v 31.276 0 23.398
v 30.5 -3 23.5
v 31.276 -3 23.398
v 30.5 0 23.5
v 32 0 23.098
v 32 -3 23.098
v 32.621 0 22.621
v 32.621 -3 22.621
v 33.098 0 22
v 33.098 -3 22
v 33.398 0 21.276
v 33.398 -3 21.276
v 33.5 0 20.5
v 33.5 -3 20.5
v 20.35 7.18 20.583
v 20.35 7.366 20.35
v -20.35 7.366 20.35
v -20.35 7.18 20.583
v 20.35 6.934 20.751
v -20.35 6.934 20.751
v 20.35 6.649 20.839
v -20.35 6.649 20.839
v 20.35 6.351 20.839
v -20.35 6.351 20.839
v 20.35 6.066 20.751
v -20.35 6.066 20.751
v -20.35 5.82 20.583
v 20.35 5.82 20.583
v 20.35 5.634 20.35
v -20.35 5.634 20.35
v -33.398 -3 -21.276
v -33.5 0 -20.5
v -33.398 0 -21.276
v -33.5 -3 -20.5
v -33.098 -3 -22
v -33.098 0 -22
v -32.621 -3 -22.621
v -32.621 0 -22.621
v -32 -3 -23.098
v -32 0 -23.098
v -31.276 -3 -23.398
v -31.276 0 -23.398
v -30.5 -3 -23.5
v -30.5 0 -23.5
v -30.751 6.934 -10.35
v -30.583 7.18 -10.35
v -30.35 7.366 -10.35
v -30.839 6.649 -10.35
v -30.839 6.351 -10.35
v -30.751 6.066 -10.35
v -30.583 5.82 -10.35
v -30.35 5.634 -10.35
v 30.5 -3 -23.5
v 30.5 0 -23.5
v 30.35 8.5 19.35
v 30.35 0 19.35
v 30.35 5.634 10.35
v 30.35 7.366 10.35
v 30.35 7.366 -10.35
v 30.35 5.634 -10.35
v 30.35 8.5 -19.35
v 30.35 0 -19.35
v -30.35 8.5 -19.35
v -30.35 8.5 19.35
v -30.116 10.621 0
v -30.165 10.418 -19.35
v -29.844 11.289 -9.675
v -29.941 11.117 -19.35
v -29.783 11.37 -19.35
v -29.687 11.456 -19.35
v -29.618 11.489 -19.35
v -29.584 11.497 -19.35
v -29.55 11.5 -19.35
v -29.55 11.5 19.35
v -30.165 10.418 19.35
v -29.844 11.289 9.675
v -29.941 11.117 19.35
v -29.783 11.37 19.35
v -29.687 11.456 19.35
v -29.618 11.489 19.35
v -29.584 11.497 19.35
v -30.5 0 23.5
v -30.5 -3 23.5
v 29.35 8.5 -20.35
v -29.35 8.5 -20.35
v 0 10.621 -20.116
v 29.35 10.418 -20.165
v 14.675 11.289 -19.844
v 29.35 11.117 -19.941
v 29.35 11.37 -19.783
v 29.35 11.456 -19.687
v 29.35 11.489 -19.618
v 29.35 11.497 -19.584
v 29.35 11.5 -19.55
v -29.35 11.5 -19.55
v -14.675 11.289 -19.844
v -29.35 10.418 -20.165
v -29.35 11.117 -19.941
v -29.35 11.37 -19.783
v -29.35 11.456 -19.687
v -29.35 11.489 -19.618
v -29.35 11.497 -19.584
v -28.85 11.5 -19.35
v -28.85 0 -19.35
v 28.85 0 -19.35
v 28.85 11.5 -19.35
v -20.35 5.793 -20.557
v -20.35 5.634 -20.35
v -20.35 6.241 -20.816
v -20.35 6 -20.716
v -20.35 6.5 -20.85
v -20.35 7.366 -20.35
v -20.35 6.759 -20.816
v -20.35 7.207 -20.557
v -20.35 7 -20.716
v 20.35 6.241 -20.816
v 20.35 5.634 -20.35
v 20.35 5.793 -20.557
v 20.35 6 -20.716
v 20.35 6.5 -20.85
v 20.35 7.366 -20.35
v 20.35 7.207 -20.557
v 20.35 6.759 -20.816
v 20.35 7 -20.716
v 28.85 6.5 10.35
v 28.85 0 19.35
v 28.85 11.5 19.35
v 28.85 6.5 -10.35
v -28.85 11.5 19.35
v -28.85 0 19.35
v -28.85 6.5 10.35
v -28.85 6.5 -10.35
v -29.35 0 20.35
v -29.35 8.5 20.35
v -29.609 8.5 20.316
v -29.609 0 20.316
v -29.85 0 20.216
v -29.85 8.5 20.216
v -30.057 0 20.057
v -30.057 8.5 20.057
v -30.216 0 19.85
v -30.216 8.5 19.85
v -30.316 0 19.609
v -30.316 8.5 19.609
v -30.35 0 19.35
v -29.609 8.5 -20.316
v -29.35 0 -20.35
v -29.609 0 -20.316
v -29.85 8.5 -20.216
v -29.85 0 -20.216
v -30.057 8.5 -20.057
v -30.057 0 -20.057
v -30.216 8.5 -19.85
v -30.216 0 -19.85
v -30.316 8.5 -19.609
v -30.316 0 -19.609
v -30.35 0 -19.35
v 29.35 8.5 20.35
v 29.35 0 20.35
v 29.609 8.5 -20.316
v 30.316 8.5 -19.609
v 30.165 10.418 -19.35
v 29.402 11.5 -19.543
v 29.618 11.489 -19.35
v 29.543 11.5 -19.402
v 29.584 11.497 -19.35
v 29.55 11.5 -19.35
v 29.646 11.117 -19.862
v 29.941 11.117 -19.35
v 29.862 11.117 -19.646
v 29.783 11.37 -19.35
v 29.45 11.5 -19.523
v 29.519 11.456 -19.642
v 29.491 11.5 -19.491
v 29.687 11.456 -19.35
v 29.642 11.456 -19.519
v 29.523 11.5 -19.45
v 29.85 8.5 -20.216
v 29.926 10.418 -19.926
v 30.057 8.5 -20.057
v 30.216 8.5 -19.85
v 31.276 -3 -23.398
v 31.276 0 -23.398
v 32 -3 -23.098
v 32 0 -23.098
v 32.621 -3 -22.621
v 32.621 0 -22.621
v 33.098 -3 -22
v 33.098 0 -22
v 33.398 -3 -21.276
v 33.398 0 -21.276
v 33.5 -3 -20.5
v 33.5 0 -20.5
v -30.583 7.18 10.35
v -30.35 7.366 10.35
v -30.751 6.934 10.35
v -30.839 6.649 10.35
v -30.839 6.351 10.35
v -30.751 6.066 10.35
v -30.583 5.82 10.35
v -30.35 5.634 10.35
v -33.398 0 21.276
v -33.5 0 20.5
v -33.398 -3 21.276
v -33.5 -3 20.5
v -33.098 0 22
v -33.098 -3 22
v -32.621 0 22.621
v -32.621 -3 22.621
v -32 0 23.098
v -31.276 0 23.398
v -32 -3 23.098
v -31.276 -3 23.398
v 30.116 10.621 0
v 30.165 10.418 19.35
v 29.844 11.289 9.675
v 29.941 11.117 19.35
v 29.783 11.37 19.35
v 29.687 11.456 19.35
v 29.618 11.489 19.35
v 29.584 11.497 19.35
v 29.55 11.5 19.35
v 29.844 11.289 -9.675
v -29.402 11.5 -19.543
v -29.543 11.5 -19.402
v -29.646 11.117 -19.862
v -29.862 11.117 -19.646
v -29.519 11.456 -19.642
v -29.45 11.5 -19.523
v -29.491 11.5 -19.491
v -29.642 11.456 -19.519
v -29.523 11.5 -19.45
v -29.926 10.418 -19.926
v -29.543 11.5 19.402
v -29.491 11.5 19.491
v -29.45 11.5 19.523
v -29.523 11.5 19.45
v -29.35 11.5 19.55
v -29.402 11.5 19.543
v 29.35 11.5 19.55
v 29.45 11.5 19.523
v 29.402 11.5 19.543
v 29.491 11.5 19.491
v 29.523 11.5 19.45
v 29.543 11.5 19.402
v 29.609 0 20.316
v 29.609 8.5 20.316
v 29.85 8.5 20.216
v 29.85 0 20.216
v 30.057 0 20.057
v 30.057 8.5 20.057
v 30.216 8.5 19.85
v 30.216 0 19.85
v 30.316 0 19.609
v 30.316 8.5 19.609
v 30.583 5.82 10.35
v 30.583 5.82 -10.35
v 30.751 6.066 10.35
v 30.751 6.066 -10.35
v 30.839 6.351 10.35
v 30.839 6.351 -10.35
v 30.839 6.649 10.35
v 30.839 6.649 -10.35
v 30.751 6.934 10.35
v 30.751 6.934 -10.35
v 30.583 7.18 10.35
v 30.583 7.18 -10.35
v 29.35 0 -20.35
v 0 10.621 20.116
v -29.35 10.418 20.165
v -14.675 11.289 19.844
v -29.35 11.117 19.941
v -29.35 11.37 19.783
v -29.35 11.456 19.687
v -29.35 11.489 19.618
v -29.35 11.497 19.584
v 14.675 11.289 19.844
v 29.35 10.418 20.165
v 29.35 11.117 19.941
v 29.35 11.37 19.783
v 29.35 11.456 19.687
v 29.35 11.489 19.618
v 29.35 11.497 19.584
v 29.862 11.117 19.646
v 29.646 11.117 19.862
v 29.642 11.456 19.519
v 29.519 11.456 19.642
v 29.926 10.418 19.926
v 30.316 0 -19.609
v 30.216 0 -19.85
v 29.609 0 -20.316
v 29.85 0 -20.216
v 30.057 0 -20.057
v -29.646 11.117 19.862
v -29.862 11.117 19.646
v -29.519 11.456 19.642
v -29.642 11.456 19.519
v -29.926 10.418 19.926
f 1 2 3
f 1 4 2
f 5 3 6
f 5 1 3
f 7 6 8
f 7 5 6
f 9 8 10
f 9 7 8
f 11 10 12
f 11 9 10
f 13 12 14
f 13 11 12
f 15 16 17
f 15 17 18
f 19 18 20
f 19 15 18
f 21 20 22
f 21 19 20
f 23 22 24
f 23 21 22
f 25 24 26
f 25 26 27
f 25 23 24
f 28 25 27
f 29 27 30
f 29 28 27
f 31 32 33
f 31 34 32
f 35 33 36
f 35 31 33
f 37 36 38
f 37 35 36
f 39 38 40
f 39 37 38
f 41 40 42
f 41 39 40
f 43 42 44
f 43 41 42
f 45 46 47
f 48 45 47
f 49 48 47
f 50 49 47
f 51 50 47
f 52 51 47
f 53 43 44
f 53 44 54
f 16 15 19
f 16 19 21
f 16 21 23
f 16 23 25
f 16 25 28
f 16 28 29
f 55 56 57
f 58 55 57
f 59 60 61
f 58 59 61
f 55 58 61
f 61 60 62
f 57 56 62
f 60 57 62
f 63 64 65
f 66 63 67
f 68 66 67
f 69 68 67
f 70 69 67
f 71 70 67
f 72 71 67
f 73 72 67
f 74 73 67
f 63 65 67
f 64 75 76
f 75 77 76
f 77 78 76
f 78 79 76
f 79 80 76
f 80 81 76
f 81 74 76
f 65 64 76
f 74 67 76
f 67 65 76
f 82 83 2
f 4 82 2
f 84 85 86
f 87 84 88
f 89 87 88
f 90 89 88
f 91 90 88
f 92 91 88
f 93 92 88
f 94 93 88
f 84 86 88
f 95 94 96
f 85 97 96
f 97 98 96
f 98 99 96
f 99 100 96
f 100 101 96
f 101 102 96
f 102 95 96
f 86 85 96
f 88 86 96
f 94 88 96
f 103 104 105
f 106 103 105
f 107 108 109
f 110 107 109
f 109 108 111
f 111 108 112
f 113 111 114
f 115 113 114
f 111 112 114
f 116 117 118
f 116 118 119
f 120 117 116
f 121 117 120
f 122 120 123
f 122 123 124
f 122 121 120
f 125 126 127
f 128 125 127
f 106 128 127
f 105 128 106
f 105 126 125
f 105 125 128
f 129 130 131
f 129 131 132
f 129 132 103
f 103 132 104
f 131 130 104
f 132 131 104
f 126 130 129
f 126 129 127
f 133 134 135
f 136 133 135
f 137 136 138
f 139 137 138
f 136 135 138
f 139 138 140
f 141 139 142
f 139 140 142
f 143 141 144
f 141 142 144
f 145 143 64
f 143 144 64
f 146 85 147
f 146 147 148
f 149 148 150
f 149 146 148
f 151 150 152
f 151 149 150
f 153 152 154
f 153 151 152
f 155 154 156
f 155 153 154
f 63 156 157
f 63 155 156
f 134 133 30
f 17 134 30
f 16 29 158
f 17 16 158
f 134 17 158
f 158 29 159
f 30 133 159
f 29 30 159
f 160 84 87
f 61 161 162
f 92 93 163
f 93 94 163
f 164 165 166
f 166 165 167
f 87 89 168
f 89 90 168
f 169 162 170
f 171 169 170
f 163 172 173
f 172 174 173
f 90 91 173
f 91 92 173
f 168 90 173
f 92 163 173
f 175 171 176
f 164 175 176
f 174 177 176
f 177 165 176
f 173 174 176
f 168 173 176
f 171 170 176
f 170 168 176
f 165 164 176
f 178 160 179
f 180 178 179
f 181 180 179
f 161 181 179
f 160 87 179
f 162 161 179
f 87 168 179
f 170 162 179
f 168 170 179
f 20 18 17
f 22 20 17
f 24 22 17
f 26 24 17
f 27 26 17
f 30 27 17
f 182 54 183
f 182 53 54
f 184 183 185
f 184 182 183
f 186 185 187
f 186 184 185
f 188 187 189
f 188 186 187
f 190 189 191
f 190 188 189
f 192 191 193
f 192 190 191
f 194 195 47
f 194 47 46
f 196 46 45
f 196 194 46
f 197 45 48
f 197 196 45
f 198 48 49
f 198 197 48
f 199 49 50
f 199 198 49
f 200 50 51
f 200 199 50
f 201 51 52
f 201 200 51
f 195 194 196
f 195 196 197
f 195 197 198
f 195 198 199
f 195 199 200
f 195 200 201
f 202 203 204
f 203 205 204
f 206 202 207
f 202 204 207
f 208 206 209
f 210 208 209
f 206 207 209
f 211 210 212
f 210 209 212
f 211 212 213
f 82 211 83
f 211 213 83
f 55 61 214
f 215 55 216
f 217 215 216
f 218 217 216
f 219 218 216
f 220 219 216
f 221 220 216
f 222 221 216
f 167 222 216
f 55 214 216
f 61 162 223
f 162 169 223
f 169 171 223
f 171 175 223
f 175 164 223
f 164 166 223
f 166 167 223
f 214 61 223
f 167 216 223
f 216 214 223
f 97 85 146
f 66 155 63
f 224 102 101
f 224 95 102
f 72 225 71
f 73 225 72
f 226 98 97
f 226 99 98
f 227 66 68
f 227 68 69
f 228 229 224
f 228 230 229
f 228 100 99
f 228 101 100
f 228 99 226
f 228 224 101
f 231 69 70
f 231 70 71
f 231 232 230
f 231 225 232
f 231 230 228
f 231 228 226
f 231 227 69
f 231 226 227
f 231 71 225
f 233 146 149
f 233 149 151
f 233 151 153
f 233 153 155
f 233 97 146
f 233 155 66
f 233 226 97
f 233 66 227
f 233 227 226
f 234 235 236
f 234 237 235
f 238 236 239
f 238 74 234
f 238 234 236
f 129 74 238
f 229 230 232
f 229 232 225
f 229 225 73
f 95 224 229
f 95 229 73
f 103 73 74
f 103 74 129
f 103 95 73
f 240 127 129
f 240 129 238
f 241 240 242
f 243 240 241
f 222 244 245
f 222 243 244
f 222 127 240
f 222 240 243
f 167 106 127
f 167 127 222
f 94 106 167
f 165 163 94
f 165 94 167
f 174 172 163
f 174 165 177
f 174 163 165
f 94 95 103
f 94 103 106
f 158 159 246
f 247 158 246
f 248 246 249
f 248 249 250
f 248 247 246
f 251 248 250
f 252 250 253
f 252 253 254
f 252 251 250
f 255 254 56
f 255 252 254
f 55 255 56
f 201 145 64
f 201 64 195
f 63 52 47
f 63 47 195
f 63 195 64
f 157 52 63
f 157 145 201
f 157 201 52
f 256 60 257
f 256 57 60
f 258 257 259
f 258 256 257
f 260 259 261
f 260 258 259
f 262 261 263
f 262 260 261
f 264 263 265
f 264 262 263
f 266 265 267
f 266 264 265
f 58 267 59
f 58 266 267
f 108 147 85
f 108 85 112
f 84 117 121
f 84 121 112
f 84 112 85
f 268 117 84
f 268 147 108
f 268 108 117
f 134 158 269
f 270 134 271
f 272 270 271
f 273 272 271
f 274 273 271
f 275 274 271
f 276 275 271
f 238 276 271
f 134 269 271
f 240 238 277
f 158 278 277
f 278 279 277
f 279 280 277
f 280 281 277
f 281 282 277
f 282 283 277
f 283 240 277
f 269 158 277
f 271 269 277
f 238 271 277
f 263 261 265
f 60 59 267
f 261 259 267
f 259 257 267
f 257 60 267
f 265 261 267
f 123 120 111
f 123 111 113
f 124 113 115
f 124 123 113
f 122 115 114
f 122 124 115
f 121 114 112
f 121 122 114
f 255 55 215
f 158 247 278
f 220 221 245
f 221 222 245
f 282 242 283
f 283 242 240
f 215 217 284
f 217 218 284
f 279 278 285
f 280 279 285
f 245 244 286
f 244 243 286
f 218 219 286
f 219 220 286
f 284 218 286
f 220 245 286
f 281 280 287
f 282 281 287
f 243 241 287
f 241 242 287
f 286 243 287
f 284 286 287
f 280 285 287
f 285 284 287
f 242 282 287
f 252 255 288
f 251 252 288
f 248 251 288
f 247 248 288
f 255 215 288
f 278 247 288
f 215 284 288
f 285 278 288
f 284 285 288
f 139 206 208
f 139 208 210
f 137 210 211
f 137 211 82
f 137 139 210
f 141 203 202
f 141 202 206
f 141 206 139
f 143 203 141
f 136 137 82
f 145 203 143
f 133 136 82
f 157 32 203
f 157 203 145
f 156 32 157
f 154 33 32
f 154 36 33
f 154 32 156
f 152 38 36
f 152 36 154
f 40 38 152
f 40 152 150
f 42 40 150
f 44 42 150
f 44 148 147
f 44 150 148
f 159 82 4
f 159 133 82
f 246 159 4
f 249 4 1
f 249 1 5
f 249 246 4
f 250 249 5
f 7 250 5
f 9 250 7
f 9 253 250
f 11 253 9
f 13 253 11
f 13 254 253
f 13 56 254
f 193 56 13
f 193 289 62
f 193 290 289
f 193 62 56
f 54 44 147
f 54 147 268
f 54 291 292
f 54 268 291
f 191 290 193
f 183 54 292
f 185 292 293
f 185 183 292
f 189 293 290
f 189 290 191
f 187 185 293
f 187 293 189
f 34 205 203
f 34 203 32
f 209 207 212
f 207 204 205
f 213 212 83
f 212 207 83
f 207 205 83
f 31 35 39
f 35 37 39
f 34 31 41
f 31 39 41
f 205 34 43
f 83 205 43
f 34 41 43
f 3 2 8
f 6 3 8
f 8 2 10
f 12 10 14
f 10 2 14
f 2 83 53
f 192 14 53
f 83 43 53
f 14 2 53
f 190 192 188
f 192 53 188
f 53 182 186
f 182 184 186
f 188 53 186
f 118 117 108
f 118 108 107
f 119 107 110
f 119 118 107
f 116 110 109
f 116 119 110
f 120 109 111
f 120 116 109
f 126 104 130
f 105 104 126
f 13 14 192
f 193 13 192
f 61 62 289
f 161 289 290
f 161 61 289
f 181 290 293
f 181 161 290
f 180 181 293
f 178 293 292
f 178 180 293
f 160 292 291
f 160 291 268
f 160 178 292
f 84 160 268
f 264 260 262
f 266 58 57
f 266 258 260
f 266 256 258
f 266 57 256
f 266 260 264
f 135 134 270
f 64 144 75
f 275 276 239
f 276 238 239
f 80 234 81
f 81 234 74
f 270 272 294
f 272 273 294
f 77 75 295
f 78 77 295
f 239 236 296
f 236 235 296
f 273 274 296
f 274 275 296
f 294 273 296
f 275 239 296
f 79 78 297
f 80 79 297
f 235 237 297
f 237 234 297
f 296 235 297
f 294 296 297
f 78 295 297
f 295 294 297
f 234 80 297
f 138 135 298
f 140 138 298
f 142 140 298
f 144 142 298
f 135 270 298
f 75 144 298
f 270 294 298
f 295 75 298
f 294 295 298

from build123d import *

# Parameters (mm, degrees)
SKETCH1_W           = 61
SKETCH1_H           = 41
BOSS_EXTRUDE1_DEPTH = 23
SHELL1_T            = 3
SKETCH2_W           = 67
SKETCH2_H           = 47
CUT_EXTRUDE1_DEPTH  = 23
SKETCH3_W           = 60.7
SKETCH3_H           = 40.7
SKETCH3_W_2         = 57.7
SKETCH3_H_2         = 38.7
BOSS_EXTRUDE2_DEPTH = 11.5
BOSS_EXTRUDE3_START = -10
SKETCH4_R           = 1
BOSS_EXTRUDE3_DEPTH = 20.7
BOSS_EXTRUDE4_START = -10
BOSS_EXTRUDE4_DEPTH = 40.7
FILLET1_R           = 3
FILLET2_R           = 1
FILLET3_SIZE        = 3
FILLET3_SIZE_2      = 0.8


with BuildPart() as part:
    # Sketch1 → Boss-Extrude1 (new body)
    with BuildSketch(Plane(origin=(0, 0, 0), x_dir=(1, 0, 0), z_dir=(0, 1, 0))):
        Rectangle(SKETCH1_W, SKETCH1_H)
    extrude(amount=BOSS_EXTRUDE1_DEPTH)

    # Shell1
    shell1_openings = [part.faces().sort_by_distance(p)[0] for p in [
        (0, 23, 0),
    ]]
    offset(amount=SHELL1_T, openings=shell1_openings, kind=Kind.INTERSECTION)

    # Sketch2 → Cut-Extrude1 (cut)
    with BuildSketch(Plane(origin=(0, 23, 0), x_dir=(1, 0, 0), z_dir=(0, 1, 0))):
        Rectangle(SKETCH2_W, SKETCH2_H)
    extrude(amount=-CUT_EXTRUDE1_DEPTH, mode=Mode.SUBTRACT)

    # Sketch3 → Boss-Extrude2 (add)
    with BuildSketch(Plane(origin=(0, 0, 0), x_dir=(1, 0, 0), z_dir=(0, 1, 0))):
        Rectangle(SKETCH3_W, SKETCH3_H)
        Rectangle(SKETCH3_W_2, SKETCH3_H_2, mode=Mode.SUBTRACT)
    extrude(amount=BOSS_EXTRUDE2_DEPTH)

    # Sketch4 → Boss-Extrude3 (add)
    with BuildSketch(Plane.XY.offset(20.35).offset(BOSS_EXTRUDE3_START)):
        with Locations((-29.85, 6.5)):
            Circle(SKETCH4_R)
        with Locations((29.85, 6.5)):
            Circle(SKETCH4_R)
    extrude(amount=-BOSS_EXTRUDE3_DEPTH)

    # Sketch5 → Boss-Extrude4 (add)
    with BuildSketch(Plane(origin=(30.35, 0, 0), x_dir=(0, 0, -1), z_dir=(1, 0, 0)).offset(BOSS_EXTRUDE4_START)):
        with BuildLine():
            Line((-20.35, 5.633974596), (-20.35, 7.366025404))
            ThreePointArc((-20.35, 7.366025404), (-20.85, 6.5), (-20.35, 5.633974596))
        make_face()
        with BuildLine():
            ThreePointArc((20.35, 5.633974596), (20.716025404, 6), (20.85, 6.5))
            ThreePointArc((20.85, 6.5), (20.716025404, 7), (20.35, 7.366025404))
            Line((20.35, 7.366025404), (20.35, 5.633974596))
        make_face()
    extrude(amount=-BOSS_EXTRUDE4_DEPTH)

    # Fillet1
    fillet1_edges = [part.edges().sort_by_distance(p)[0] for p in [
        (33.5, -1.5, 23.5),
        (-33.5, -1.5, 23.5),
        (-33.5, -1.5, -23.5),
        (33.5, -1.5, -23.5),
    ]]
    fillet(fillet1_edges, radius=FILLET1_R)

    # Fillet2
    fillet2_edges = [part.edges().sort_by_distance(p)[0] for p in [
        (30.35, 5.75, 20.35),
        (30.35, 5.75, -20.35),
        (-30.35, 5.75, -20.35),
        (-30.35, 5.75, 20.35),
    ]]
    fillet(fillet2_edges, radius=FILLET2_R)

    # Fillet3
    # an asymmetric fillet: 3, 0.8 mm, written as the material it takes off along each edge
    with BuildSketch(Plane(origin=(30.35, 11.5, -19.35), x_dir=(0, -1, 0), z_dir=(0, 0, 1)), Plane(origin=(-30.35, 11.5, 19.35), x_dir=(0, -1, 0), z_dir=(0, 0, -1))) as fillet3_piece_1:
        with BuildLine():
            Bezier((FILLET3_SIZE, 0), (0, 0), (0, -FILLET3_SIZE_2), weights=[1, 0.707106781, 1])
            Line((0, -FILLET3_SIZE_2), (0, 0))
            Line((0, 0), (FILLET3_SIZE, 0))
        make_face()
    extrude(amount=38.7, mode=Mode.SUBTRACT)
    with BuildSketch(Plane(origin=(29.35, 11.5, -19.35), x_dir=(0, 0, -1), z_dir=(-1, 0, 0))) as fillet3_piece_2:
        with BuildLine():
            Bezier((1, FILLET3_SIZE), (1, 0), (1 - FILLET3_SIZE_2, 0), weights=[1, 0.707106781, 1])
            Line((1 - FILLET3_SIZE_2, 0), (1, 0))
            Line((1, 0), (1, FILLET3_SIZE))
        make_face()
    revolve(axis=Axis((29.35, 11.5, -19.35), (0, -1, 0)), revolution_arc=90, mode=Mode.SUBTRACT)
    with BuildSketch(Plane(origin=(29.35, 11.5, 19.35), x_dir=(1, 0, 0), z_dir=(0, 0, -1))) as fillet3_piece_3:
        with BuildLine():
            Bezier((1, FILLET3_SIZE), (1, 0), (1 - FILLET3_SIZE_2, 0), weights=[1, 0.707106781, 1])
            Line((1 - FILLET3_SIZE_2, 0), (1, 0))
            Line((1, 0), (1, FILLET3_SIZE))
        make_face()
    revolve(axis=Axis((29.35, 11.5, 19.35), (0, -1, 0)), revolution_arc=90, mode=Mode.SUBTRACT)
    with BuildSketch(Plane(origin=(-29.35, 11.5, -20.35), x_dir=(0, -1, 0), z_dir=(1, 0, 0)), Plane(origin=(29.35, 11.5, 20.35), x_dir=(0, -1, 0), z_dir=(-1, 0, 0))) as fillet3_piece_4:
        with BuildLine():
            Bezier((FILLET3_SIZE, 0), (0, 0), (0, -FILLET3_SIZE_2), weights=[1, 0.707106781, 1])
            Line((0, -FILLET3_SIZE_2), (0, 0))
            Line((0, 0), (FILLET3_SIZE, 0))
        make_face()
    extrude(amount=58.7, mode=Mode.SUBTRACT)
    with BuildSketch(Plane(origin=(-29.35, 11.5, -19.35), x_dir=(0, 0, -1), z_dir=(1, 0, 0))) as fillet3_piece_5:
        with BuildLine():
            Bezier((1, -FILLET3_SIZE), (1, 0), (1 - FILLET3_SIZE_2, 0), weights=[1, 0.707106781, 1])
            Line((1 - FILLET3_SIZE_2, 0), (1, 0))
            Line((1, 0), (1, -FILLET3_SIZE))
        make_face()
    revolve(axis=Axis((-29.35, 11.5, -19.35), (0, 1, 0)), revolution_arc=90, mode=Mode.SUBTRACT)
    with BuildSketch(Plane(origin=(-29.35, 11.5, 19.35), x_dir=(0, 0, 1), z_dir=(1, 0, 0))) as fillet3_piece_6:
        with BuildLine():
            Bezier((1, FILLET3_SIZE), (1, 0), (1 - FILLET3_SIZE_2, 0), weights=[1, 0.707106781, 1])
            Line((1 - FILLET3_SIZE_2, 0), (1, 0))
            Line((1, 0), (1, FILLET3_SIZE))
        make_face()
    revolve(axis=Axis((-29.35, 11.5, 19.35), (0, -1, 0)), revolution_arc=90, mode=Mode.SUBTRACT)


solid = part.part
